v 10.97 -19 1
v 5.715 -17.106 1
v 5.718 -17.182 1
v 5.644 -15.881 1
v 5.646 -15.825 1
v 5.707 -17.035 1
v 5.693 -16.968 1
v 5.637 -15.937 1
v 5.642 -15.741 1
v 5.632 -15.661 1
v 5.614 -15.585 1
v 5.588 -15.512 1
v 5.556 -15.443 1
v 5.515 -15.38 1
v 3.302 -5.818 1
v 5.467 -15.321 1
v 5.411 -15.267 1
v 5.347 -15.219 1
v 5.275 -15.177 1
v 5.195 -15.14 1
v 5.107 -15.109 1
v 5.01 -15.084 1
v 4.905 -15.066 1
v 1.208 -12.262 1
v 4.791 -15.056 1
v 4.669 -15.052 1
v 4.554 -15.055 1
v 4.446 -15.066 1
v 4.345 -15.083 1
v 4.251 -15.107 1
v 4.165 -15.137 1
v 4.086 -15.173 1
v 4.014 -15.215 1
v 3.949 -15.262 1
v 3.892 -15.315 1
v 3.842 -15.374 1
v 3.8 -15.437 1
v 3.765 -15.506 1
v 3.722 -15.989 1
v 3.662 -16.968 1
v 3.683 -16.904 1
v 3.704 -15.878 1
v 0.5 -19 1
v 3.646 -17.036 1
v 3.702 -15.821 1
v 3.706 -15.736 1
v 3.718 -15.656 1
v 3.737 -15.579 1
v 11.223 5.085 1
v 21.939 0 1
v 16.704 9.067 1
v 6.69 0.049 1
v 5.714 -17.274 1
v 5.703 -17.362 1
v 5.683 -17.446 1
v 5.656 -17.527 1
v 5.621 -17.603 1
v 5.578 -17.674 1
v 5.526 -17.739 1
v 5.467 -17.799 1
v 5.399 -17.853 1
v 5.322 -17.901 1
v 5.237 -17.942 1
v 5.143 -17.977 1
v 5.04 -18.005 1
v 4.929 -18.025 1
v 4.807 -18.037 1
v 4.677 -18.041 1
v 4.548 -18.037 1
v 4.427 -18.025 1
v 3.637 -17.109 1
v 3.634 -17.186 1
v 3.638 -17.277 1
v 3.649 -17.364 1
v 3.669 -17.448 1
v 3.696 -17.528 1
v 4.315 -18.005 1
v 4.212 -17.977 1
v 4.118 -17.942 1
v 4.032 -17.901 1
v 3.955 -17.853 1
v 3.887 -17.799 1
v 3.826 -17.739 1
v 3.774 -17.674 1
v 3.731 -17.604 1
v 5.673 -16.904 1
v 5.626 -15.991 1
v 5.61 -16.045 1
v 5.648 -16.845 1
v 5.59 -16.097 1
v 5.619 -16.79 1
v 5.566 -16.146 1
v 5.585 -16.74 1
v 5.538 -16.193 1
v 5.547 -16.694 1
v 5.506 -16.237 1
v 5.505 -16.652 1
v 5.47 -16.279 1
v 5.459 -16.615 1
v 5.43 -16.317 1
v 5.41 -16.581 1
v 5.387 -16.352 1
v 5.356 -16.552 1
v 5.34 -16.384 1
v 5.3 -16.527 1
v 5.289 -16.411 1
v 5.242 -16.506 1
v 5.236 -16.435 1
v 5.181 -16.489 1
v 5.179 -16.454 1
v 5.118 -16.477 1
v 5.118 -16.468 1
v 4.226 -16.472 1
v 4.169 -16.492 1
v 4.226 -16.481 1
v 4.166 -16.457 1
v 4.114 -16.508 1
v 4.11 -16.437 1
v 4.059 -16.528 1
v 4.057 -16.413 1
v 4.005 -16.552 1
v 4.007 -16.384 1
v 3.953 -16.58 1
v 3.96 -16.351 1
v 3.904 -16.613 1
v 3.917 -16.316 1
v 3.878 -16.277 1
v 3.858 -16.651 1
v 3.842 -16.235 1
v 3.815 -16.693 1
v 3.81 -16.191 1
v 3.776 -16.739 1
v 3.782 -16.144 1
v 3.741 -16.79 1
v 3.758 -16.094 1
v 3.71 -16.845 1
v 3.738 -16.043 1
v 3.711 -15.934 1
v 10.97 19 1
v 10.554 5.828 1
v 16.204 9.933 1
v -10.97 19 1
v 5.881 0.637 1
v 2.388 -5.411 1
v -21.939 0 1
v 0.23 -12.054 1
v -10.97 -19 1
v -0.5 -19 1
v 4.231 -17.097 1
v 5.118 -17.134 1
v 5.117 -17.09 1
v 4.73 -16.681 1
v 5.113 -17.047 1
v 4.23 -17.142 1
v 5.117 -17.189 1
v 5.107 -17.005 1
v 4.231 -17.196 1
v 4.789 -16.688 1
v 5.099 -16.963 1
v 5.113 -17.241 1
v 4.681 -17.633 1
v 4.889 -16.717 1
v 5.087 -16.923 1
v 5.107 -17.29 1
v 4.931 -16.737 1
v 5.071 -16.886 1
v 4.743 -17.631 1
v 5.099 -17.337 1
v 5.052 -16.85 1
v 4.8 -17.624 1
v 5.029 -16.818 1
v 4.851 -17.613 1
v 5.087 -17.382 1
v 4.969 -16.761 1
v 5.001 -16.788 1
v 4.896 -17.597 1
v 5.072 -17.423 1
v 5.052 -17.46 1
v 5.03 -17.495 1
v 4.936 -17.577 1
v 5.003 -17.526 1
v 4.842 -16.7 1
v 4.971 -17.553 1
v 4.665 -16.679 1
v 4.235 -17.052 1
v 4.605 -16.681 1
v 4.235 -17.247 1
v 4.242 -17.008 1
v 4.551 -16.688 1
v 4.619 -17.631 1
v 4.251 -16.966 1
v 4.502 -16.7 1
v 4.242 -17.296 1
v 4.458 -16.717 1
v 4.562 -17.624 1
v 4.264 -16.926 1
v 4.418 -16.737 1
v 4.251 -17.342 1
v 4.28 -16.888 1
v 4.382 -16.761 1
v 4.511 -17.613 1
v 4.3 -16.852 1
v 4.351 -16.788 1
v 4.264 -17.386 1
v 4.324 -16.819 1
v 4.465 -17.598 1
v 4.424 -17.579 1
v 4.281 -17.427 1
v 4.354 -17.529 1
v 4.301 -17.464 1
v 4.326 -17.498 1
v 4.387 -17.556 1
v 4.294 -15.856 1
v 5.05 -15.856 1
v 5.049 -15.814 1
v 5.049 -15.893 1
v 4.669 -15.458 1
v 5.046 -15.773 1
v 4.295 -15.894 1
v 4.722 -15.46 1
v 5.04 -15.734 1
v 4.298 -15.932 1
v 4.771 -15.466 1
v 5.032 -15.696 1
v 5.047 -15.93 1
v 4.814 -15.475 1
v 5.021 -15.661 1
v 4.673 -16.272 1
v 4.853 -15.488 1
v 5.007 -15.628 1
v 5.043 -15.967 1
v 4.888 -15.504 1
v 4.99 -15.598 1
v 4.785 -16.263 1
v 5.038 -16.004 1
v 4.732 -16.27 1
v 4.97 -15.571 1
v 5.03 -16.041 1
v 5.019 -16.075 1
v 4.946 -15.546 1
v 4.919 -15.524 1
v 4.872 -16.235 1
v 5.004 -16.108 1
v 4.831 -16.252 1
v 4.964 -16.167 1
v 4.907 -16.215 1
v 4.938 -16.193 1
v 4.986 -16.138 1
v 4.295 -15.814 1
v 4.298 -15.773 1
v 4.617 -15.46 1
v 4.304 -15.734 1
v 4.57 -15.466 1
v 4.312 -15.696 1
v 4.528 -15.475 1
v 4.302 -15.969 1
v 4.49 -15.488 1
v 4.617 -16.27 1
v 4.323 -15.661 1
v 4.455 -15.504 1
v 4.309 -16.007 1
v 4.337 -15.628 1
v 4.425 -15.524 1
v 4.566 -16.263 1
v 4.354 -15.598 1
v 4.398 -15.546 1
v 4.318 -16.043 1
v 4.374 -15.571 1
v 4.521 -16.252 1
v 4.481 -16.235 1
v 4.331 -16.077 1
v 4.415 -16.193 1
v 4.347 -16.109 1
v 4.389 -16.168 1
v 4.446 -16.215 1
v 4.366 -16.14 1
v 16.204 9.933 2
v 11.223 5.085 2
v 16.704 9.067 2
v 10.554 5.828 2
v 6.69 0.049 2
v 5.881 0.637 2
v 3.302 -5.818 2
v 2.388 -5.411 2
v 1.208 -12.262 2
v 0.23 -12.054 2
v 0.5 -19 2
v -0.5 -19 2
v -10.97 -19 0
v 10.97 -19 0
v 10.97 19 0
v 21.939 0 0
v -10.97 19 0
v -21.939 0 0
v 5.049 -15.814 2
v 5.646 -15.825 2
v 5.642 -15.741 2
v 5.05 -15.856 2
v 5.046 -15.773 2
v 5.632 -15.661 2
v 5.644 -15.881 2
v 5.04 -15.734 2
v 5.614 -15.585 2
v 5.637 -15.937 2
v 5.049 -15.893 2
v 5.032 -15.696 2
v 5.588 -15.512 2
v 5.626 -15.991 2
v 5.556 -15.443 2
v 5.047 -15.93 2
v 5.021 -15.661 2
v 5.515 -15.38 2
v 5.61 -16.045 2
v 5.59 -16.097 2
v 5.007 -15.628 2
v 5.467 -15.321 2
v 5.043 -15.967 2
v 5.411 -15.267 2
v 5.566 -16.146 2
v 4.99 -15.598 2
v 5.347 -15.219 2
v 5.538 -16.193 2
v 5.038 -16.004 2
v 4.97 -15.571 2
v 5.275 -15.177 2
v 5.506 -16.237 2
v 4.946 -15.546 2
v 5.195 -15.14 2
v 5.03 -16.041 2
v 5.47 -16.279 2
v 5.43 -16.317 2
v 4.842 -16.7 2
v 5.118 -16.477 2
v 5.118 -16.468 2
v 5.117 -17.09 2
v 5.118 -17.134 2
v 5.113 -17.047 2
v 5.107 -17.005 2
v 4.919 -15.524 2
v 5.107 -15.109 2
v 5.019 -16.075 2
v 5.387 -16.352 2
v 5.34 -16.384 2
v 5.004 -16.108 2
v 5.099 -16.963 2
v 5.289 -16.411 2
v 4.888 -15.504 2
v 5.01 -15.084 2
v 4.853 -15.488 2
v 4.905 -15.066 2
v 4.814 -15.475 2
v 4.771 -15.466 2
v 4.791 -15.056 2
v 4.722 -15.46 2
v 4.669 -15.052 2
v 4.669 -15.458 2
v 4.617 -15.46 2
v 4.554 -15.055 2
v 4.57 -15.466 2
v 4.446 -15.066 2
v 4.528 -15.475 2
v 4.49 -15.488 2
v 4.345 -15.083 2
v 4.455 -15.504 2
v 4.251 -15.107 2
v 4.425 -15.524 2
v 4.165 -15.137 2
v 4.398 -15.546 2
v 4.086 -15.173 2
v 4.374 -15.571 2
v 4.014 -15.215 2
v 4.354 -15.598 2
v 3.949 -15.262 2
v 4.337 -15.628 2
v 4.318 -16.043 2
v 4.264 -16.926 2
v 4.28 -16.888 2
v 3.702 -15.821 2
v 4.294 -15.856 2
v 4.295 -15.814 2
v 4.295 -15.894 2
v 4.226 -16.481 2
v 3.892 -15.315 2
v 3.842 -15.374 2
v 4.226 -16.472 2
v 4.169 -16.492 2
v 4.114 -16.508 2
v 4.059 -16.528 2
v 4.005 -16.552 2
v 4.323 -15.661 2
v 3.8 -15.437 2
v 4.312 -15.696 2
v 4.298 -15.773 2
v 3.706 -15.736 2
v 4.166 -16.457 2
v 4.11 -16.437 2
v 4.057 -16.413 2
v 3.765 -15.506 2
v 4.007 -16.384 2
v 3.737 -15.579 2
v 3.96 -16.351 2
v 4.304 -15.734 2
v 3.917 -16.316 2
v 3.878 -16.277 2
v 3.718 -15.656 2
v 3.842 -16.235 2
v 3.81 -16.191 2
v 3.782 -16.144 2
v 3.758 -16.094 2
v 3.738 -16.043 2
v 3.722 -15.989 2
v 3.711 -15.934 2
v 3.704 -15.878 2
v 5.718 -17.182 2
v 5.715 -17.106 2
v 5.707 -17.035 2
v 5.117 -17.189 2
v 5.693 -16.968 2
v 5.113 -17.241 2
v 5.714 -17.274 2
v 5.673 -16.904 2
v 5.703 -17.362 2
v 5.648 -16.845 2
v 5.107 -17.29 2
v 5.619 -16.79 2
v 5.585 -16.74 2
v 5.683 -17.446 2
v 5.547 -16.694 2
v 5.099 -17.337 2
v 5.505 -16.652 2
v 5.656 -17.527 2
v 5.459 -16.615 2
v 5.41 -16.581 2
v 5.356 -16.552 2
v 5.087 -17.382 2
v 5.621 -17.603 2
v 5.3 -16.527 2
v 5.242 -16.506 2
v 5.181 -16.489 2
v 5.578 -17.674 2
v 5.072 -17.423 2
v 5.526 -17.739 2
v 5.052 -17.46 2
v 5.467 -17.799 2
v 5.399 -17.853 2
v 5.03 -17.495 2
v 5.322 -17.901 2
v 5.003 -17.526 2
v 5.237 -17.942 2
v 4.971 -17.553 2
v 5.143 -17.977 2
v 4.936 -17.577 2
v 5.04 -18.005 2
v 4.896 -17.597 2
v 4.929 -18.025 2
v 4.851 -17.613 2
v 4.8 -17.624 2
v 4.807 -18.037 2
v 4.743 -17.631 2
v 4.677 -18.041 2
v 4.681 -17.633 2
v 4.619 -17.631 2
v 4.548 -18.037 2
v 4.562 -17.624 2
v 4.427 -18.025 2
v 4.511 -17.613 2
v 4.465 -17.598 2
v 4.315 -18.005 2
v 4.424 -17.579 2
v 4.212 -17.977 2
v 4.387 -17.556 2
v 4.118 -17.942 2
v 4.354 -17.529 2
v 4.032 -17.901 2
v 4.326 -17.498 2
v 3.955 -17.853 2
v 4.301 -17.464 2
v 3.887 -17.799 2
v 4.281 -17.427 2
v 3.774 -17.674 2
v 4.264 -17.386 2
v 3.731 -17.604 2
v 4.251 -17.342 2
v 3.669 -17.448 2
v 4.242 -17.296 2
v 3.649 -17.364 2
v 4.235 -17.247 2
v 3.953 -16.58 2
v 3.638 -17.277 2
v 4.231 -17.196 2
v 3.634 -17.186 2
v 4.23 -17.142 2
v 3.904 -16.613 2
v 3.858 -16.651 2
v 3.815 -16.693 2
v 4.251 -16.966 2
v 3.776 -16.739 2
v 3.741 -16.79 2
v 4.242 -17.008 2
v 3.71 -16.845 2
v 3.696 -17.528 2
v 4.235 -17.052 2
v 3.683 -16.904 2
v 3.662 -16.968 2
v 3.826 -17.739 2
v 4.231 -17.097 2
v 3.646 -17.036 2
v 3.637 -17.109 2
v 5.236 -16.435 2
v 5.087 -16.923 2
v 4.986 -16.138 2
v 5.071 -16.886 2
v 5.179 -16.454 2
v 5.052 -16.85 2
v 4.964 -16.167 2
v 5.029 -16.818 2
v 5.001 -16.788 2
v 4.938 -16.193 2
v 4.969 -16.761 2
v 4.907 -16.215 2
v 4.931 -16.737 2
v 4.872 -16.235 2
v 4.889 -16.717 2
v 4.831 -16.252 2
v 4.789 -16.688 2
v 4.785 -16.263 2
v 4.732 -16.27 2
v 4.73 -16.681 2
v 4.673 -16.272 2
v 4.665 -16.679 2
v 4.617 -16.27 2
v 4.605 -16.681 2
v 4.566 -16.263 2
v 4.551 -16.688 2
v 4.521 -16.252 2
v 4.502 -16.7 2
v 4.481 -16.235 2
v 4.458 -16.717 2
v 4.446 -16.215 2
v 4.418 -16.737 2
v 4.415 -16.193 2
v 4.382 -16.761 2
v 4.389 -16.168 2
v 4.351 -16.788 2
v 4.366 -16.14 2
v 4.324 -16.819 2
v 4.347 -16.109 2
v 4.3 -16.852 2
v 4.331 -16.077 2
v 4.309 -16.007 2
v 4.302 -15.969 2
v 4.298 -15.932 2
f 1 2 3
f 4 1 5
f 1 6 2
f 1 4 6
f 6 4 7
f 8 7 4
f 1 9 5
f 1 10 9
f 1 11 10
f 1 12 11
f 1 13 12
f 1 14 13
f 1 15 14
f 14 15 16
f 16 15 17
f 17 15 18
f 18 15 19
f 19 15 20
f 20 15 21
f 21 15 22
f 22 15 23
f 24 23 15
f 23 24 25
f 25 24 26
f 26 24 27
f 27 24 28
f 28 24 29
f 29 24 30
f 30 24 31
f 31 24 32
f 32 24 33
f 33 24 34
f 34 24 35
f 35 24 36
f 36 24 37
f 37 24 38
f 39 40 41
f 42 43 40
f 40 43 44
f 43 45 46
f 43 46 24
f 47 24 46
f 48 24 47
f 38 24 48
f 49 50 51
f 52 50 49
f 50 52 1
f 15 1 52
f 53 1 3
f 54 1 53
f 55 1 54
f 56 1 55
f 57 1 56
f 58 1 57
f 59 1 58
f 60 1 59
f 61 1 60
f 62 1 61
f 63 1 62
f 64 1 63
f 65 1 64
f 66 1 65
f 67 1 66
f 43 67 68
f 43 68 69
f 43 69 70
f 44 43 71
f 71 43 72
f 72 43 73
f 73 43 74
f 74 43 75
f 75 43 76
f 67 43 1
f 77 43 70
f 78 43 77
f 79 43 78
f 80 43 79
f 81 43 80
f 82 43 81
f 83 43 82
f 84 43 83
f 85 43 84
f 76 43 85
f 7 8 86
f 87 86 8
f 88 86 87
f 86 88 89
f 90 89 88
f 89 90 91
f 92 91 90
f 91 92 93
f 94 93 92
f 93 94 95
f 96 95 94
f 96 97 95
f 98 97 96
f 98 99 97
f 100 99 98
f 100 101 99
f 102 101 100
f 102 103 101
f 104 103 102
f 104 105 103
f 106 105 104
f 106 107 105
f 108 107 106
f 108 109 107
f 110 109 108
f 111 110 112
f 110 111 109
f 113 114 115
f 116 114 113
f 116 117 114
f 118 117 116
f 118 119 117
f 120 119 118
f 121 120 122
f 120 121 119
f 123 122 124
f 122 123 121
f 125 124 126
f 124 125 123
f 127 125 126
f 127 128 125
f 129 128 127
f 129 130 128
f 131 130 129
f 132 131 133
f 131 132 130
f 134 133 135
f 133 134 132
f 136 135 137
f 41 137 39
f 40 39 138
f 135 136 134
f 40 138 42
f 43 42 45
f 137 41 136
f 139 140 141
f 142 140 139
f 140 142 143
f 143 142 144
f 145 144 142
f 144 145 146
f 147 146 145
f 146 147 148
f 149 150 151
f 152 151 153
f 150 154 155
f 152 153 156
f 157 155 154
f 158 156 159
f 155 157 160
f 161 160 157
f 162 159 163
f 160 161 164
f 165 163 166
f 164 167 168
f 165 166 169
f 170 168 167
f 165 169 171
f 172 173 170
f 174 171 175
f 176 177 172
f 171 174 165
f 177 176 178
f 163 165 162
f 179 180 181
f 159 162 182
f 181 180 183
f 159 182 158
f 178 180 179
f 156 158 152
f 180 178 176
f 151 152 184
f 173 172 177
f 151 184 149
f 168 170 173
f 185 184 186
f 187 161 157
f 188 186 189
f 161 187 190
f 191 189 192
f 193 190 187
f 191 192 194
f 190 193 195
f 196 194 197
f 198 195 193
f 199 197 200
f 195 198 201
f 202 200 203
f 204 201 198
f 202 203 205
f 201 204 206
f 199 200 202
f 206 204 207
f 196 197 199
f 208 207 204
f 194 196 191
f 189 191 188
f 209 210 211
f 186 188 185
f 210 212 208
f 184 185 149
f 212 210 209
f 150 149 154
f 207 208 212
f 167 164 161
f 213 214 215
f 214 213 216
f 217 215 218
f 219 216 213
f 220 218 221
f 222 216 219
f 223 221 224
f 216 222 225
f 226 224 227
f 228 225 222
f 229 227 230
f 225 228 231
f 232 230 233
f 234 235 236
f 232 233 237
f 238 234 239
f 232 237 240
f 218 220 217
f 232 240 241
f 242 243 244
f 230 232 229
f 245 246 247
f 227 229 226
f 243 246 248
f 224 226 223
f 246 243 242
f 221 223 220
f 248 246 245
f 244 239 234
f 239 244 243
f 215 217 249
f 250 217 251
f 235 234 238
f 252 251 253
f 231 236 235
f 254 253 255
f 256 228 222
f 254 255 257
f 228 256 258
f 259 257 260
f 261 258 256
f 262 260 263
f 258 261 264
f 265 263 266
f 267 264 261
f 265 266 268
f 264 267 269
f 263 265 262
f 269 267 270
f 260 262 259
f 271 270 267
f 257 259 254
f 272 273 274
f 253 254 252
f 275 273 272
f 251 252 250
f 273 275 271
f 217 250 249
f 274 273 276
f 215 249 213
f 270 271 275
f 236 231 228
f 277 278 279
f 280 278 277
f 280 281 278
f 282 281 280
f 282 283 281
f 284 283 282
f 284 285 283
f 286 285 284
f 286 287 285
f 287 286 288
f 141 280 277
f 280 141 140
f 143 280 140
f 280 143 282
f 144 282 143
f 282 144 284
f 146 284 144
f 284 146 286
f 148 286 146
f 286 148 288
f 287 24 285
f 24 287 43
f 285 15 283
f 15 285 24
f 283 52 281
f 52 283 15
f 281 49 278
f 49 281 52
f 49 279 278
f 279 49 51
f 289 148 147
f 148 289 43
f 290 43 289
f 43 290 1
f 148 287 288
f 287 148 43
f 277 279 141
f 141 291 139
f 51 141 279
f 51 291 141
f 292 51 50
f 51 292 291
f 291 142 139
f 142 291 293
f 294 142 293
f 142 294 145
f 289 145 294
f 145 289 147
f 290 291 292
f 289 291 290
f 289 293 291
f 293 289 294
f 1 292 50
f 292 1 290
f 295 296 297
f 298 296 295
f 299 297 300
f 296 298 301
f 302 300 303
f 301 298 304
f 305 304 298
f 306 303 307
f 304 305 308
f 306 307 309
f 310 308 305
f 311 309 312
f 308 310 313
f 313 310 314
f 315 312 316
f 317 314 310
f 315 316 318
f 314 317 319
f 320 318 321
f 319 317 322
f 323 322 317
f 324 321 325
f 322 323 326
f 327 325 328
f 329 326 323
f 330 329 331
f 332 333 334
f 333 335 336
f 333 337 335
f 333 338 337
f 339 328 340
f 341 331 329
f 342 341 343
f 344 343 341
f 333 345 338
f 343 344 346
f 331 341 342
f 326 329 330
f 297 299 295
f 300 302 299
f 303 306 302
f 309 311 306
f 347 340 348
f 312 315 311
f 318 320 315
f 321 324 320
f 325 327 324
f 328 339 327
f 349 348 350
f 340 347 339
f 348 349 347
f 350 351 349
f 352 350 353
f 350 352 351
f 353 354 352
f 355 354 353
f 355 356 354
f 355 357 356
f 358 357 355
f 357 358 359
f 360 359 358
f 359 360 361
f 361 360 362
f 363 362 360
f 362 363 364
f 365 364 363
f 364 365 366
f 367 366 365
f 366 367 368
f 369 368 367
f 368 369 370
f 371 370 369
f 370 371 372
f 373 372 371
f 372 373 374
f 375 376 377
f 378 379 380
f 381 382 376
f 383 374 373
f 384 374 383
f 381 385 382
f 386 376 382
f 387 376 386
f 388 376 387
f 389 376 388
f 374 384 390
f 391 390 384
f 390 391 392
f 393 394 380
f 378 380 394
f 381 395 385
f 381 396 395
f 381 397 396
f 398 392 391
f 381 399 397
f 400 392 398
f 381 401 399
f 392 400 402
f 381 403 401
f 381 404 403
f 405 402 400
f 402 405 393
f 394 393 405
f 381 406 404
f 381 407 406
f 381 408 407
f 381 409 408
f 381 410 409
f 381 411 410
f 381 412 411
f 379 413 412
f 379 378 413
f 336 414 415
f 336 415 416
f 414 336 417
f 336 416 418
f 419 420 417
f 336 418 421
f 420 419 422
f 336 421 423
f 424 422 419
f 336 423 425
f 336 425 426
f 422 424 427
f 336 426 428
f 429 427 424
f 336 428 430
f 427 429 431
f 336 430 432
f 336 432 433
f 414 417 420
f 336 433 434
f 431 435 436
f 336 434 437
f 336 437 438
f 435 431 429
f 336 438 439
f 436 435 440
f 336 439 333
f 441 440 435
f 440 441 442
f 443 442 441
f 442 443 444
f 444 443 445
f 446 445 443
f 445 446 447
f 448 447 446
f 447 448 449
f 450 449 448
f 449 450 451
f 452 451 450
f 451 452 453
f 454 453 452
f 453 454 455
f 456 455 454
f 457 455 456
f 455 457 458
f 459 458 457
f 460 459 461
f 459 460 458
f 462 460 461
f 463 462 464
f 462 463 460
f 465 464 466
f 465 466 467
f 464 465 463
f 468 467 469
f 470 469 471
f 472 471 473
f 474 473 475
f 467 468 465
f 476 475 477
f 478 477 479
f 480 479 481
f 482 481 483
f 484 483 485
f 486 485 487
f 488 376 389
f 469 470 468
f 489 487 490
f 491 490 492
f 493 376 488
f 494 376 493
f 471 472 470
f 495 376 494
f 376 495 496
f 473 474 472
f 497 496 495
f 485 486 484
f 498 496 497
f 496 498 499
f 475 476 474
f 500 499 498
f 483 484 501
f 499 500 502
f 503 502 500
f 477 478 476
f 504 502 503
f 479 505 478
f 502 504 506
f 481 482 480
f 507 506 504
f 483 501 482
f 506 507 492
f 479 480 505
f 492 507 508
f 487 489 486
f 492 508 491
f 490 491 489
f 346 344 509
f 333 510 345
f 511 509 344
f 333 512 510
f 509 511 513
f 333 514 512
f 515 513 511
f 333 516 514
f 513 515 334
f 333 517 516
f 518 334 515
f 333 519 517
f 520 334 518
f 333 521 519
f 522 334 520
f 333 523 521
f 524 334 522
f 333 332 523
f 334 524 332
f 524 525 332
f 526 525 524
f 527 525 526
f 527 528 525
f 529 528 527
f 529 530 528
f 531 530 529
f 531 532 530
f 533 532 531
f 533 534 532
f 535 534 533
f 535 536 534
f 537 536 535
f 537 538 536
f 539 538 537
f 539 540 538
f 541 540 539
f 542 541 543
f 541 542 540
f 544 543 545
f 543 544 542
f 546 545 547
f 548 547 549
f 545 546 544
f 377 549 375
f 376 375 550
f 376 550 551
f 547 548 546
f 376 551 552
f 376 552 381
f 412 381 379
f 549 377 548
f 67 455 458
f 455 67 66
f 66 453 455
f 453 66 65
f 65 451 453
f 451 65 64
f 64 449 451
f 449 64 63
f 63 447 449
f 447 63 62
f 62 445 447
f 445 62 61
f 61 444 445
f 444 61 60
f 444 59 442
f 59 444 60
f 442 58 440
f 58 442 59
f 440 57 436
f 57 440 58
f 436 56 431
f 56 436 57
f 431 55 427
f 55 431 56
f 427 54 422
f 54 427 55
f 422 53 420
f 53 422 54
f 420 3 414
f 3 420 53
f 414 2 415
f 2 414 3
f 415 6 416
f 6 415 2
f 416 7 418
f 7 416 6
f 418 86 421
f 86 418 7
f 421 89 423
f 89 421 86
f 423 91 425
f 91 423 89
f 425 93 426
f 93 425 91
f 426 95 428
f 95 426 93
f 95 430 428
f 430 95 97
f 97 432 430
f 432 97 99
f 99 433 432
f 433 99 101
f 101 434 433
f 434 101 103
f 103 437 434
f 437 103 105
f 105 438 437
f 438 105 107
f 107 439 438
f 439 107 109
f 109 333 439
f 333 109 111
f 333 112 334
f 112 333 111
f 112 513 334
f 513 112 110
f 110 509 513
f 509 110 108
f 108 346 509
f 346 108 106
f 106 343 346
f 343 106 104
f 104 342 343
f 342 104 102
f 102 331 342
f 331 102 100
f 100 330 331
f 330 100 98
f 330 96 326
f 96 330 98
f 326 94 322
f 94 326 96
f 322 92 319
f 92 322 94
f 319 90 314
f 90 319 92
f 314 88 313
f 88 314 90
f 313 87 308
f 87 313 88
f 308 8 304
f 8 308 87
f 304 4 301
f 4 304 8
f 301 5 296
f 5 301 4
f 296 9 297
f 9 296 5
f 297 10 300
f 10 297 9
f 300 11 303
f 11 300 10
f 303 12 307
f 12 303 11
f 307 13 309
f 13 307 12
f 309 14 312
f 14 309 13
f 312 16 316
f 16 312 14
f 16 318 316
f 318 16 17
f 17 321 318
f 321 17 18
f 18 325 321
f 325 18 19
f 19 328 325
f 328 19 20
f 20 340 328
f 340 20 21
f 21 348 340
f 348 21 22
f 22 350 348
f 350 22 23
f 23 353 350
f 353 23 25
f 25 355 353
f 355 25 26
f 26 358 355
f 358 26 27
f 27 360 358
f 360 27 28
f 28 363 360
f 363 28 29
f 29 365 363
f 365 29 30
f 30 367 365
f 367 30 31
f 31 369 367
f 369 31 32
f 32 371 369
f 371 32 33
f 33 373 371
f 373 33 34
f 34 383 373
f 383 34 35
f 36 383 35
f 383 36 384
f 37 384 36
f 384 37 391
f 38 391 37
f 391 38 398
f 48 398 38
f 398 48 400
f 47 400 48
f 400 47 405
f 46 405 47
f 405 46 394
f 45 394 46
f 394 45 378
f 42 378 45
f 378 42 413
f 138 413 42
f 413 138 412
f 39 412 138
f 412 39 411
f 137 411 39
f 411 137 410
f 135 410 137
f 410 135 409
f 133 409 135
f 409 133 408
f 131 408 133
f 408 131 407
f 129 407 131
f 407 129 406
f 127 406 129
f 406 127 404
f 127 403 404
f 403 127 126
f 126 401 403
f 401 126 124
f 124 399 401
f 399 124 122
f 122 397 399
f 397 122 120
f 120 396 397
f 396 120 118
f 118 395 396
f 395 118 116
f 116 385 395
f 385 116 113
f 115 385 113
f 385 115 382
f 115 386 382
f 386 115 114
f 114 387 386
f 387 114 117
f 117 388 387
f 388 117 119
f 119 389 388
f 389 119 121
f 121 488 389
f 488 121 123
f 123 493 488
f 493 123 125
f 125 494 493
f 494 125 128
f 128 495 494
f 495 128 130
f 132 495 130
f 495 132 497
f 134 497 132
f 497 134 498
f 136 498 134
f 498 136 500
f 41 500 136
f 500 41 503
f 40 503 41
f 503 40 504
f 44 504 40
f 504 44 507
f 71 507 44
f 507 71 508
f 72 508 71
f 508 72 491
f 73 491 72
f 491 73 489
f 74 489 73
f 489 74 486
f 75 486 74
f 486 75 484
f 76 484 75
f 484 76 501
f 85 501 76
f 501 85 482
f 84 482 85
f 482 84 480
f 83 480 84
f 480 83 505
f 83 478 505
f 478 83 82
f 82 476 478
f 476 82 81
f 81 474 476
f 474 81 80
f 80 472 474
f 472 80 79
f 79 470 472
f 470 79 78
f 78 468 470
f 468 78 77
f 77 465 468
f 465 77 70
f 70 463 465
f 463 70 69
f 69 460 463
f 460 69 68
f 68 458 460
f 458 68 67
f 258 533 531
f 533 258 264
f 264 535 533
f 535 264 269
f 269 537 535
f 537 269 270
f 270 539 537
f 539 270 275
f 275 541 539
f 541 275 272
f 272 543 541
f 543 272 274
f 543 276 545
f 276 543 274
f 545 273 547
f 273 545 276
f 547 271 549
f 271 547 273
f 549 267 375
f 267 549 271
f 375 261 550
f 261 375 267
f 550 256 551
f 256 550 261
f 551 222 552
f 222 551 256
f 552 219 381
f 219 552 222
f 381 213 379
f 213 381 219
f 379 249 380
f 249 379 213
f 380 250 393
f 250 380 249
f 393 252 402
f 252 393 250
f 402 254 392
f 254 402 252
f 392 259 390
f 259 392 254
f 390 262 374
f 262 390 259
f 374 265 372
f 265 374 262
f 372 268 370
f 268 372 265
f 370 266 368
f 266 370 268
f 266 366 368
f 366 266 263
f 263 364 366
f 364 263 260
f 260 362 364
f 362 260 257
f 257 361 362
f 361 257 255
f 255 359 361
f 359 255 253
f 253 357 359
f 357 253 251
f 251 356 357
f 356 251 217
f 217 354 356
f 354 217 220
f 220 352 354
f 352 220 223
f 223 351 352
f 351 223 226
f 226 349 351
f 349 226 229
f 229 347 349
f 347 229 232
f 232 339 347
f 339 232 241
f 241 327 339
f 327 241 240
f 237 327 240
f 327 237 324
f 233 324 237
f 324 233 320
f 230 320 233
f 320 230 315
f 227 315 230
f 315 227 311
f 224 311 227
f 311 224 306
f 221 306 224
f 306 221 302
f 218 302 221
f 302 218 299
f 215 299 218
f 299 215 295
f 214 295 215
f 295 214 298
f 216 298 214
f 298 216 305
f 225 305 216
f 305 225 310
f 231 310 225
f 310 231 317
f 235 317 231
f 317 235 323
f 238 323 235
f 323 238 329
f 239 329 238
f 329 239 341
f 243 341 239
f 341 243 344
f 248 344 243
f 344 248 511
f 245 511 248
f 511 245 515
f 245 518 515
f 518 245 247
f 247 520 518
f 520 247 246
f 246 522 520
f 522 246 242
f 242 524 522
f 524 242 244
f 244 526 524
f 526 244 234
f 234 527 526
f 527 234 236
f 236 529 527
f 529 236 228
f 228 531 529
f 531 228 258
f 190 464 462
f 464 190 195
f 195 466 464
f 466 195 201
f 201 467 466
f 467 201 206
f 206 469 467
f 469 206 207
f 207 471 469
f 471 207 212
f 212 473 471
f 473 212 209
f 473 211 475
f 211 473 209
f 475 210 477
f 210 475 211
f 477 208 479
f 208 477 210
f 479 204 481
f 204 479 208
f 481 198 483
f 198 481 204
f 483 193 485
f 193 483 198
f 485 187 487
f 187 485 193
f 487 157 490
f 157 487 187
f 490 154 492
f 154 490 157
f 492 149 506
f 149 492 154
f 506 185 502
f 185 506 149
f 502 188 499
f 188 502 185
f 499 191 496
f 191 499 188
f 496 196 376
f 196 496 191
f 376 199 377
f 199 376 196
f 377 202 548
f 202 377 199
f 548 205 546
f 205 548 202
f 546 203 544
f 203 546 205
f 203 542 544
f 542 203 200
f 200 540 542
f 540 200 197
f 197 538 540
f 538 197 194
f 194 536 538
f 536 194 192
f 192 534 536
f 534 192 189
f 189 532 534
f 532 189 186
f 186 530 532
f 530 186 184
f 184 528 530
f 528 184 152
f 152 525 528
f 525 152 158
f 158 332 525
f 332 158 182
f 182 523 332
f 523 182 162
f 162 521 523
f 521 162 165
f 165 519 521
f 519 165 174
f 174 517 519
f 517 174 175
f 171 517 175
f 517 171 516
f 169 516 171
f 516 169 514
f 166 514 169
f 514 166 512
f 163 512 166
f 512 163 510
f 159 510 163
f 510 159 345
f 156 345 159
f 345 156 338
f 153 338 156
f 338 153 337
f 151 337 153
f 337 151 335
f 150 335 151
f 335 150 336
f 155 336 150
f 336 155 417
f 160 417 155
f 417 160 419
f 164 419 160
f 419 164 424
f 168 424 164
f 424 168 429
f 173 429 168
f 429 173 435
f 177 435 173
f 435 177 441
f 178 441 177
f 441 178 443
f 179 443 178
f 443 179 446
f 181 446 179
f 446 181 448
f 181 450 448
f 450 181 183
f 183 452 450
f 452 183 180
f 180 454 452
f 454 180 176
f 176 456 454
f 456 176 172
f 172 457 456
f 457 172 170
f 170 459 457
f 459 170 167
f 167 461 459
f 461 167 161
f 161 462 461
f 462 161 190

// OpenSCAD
include <../Scripts/18xx tiles basic functions.scad>
hex();
put_tilenr("8");
light_curve();
